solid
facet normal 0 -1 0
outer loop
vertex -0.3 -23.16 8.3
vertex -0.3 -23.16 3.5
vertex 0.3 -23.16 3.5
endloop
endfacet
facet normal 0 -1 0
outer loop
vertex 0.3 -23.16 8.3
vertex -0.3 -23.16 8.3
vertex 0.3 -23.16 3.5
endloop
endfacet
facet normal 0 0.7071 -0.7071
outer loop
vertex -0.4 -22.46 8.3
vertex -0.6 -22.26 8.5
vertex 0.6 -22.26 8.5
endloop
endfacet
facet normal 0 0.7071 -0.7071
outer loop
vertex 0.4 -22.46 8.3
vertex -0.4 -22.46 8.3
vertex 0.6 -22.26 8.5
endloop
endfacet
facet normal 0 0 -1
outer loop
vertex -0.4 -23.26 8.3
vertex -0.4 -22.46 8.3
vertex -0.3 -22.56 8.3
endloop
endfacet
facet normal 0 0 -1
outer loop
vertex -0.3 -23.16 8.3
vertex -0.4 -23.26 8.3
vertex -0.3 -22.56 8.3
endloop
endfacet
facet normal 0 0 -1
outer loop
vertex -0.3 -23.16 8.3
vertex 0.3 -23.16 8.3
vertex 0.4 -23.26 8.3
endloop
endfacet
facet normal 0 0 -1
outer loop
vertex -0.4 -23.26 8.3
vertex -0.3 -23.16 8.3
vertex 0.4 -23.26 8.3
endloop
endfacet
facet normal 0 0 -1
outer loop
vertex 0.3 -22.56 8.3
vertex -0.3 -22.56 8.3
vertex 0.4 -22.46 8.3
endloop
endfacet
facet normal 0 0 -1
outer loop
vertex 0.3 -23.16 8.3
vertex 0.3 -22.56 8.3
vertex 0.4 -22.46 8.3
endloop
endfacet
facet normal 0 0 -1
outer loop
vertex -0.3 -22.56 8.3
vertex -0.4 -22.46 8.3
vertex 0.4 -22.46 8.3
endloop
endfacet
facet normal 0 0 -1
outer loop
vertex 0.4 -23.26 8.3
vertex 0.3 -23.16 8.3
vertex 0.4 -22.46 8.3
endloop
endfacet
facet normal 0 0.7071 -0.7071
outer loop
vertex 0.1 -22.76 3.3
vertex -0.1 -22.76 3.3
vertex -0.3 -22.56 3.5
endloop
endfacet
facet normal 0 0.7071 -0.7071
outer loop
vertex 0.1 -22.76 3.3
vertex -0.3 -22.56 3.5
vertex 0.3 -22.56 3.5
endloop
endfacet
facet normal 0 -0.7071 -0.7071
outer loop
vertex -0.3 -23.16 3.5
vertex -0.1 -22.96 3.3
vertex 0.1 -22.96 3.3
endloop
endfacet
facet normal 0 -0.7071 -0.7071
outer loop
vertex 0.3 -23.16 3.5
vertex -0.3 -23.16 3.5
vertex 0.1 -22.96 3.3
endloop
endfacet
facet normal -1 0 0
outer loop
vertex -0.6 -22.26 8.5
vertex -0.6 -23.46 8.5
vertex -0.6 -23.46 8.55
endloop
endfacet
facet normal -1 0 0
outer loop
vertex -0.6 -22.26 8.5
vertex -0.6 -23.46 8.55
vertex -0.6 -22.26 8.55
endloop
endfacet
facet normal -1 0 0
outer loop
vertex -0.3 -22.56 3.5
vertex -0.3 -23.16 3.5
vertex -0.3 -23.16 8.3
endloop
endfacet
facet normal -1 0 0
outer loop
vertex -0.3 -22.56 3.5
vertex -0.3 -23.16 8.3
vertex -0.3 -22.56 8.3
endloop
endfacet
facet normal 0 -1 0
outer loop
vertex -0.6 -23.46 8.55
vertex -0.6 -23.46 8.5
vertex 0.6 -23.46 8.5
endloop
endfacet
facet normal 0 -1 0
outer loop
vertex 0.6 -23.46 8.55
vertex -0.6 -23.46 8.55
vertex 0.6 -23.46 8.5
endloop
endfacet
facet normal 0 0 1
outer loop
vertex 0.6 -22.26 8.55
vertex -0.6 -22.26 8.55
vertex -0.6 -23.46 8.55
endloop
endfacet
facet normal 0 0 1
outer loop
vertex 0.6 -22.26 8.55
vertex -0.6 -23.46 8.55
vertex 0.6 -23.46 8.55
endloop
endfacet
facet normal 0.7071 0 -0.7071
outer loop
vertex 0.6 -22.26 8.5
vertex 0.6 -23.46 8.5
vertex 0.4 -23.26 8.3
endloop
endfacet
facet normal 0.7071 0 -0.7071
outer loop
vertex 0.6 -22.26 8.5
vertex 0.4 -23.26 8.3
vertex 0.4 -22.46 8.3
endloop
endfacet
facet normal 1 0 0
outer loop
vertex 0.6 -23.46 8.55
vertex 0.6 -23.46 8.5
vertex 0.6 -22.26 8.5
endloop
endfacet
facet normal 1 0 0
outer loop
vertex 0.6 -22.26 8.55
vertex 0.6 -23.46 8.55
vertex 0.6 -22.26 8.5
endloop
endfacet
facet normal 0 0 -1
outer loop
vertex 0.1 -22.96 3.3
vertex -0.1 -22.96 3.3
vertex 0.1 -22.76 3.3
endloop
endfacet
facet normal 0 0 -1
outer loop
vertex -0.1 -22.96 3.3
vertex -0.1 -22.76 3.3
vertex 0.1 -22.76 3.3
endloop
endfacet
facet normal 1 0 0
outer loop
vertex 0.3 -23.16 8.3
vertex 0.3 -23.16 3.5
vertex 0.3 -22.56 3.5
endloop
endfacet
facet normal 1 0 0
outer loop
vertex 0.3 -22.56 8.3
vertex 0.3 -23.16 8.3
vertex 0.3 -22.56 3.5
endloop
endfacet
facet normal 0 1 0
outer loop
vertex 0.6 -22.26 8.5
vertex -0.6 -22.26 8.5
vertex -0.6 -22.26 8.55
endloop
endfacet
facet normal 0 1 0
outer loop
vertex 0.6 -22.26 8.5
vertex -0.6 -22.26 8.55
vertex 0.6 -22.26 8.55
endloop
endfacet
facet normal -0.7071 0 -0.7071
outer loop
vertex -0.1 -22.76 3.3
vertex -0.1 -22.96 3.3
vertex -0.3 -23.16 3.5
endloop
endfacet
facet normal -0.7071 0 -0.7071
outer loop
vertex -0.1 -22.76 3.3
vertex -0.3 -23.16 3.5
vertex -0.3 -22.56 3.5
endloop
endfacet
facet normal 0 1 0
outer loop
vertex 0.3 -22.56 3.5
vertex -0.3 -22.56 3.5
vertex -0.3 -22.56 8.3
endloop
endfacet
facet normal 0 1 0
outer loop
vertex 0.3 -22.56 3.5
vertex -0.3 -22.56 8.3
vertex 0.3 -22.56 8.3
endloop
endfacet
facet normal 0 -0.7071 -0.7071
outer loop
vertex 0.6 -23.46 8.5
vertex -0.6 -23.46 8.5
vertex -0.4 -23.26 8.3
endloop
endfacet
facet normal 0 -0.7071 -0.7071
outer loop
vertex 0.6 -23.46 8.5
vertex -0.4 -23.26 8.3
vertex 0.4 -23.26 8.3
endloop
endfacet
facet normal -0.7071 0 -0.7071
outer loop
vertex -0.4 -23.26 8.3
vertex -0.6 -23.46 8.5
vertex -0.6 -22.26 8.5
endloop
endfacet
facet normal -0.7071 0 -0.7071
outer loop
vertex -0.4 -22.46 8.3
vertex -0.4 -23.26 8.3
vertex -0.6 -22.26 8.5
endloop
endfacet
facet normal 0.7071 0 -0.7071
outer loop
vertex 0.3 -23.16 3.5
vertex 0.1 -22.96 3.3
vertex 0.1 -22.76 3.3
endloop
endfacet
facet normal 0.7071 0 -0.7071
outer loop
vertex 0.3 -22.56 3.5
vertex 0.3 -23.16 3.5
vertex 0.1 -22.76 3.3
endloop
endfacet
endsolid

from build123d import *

# Parameters (mm, degrees)
SKETCH002_W     = 0.6
SKETCH002_H     = 0.6
PAD002_DEPTH    = 5
SKETCH003_W     = 1.2
SKETCH003_H     = 1.2
PAD003_DEPTH    = 0.25
CHAMFER002_SIZE = 0.2
CHAMFER003_SIZE = 0.2


with BuildPart() as part:
    # Sketch002 → Pad002 (new body)
    with BuildSketch(Plane.XY):
        Rectangle(SKETCH002_W, SKETCH002_H)
    extrude(amount=PAD002_DEPTH)

    # Sketch003 (on Face6 of Pad002) → Pad003 (join)
    with BuildSketch(Plane.XY.offset(5)):
        Rectangle(SKETCH003_W, SKETCH003_H)
    extrude(amount=PAD003_DEPTH)

    # Chamfer002
    chamfer002_edges = [part.edges().sort_by_distance(p)[0] for p in [
        (0, -0.3, 0),
        (0.3, 0, 0),
        (0, 0.3, 0),
        (-0.3, 0, 0),
    ]]
    chamfer(chamfer002_edges, length=CHAMFER002_SIZE)

    # Chamfer003
    chamfer003_edges = [part.edges().sort_by_distance(p)[0] for p in [
        (-0.6, 0, 5),
        (0, 0.6, 5),
        (0.6, 0, 5),
        (0, -0.6, 5),
    ]]
    chamfer(chamfer003_edges, length=CHAMFER003_SIZE)


with BuildPart() as part_1:
    # Body001 placement: moved
    add(part.part.moved(Location((0, -22.86, 3.3))))


solid = part_1.part
